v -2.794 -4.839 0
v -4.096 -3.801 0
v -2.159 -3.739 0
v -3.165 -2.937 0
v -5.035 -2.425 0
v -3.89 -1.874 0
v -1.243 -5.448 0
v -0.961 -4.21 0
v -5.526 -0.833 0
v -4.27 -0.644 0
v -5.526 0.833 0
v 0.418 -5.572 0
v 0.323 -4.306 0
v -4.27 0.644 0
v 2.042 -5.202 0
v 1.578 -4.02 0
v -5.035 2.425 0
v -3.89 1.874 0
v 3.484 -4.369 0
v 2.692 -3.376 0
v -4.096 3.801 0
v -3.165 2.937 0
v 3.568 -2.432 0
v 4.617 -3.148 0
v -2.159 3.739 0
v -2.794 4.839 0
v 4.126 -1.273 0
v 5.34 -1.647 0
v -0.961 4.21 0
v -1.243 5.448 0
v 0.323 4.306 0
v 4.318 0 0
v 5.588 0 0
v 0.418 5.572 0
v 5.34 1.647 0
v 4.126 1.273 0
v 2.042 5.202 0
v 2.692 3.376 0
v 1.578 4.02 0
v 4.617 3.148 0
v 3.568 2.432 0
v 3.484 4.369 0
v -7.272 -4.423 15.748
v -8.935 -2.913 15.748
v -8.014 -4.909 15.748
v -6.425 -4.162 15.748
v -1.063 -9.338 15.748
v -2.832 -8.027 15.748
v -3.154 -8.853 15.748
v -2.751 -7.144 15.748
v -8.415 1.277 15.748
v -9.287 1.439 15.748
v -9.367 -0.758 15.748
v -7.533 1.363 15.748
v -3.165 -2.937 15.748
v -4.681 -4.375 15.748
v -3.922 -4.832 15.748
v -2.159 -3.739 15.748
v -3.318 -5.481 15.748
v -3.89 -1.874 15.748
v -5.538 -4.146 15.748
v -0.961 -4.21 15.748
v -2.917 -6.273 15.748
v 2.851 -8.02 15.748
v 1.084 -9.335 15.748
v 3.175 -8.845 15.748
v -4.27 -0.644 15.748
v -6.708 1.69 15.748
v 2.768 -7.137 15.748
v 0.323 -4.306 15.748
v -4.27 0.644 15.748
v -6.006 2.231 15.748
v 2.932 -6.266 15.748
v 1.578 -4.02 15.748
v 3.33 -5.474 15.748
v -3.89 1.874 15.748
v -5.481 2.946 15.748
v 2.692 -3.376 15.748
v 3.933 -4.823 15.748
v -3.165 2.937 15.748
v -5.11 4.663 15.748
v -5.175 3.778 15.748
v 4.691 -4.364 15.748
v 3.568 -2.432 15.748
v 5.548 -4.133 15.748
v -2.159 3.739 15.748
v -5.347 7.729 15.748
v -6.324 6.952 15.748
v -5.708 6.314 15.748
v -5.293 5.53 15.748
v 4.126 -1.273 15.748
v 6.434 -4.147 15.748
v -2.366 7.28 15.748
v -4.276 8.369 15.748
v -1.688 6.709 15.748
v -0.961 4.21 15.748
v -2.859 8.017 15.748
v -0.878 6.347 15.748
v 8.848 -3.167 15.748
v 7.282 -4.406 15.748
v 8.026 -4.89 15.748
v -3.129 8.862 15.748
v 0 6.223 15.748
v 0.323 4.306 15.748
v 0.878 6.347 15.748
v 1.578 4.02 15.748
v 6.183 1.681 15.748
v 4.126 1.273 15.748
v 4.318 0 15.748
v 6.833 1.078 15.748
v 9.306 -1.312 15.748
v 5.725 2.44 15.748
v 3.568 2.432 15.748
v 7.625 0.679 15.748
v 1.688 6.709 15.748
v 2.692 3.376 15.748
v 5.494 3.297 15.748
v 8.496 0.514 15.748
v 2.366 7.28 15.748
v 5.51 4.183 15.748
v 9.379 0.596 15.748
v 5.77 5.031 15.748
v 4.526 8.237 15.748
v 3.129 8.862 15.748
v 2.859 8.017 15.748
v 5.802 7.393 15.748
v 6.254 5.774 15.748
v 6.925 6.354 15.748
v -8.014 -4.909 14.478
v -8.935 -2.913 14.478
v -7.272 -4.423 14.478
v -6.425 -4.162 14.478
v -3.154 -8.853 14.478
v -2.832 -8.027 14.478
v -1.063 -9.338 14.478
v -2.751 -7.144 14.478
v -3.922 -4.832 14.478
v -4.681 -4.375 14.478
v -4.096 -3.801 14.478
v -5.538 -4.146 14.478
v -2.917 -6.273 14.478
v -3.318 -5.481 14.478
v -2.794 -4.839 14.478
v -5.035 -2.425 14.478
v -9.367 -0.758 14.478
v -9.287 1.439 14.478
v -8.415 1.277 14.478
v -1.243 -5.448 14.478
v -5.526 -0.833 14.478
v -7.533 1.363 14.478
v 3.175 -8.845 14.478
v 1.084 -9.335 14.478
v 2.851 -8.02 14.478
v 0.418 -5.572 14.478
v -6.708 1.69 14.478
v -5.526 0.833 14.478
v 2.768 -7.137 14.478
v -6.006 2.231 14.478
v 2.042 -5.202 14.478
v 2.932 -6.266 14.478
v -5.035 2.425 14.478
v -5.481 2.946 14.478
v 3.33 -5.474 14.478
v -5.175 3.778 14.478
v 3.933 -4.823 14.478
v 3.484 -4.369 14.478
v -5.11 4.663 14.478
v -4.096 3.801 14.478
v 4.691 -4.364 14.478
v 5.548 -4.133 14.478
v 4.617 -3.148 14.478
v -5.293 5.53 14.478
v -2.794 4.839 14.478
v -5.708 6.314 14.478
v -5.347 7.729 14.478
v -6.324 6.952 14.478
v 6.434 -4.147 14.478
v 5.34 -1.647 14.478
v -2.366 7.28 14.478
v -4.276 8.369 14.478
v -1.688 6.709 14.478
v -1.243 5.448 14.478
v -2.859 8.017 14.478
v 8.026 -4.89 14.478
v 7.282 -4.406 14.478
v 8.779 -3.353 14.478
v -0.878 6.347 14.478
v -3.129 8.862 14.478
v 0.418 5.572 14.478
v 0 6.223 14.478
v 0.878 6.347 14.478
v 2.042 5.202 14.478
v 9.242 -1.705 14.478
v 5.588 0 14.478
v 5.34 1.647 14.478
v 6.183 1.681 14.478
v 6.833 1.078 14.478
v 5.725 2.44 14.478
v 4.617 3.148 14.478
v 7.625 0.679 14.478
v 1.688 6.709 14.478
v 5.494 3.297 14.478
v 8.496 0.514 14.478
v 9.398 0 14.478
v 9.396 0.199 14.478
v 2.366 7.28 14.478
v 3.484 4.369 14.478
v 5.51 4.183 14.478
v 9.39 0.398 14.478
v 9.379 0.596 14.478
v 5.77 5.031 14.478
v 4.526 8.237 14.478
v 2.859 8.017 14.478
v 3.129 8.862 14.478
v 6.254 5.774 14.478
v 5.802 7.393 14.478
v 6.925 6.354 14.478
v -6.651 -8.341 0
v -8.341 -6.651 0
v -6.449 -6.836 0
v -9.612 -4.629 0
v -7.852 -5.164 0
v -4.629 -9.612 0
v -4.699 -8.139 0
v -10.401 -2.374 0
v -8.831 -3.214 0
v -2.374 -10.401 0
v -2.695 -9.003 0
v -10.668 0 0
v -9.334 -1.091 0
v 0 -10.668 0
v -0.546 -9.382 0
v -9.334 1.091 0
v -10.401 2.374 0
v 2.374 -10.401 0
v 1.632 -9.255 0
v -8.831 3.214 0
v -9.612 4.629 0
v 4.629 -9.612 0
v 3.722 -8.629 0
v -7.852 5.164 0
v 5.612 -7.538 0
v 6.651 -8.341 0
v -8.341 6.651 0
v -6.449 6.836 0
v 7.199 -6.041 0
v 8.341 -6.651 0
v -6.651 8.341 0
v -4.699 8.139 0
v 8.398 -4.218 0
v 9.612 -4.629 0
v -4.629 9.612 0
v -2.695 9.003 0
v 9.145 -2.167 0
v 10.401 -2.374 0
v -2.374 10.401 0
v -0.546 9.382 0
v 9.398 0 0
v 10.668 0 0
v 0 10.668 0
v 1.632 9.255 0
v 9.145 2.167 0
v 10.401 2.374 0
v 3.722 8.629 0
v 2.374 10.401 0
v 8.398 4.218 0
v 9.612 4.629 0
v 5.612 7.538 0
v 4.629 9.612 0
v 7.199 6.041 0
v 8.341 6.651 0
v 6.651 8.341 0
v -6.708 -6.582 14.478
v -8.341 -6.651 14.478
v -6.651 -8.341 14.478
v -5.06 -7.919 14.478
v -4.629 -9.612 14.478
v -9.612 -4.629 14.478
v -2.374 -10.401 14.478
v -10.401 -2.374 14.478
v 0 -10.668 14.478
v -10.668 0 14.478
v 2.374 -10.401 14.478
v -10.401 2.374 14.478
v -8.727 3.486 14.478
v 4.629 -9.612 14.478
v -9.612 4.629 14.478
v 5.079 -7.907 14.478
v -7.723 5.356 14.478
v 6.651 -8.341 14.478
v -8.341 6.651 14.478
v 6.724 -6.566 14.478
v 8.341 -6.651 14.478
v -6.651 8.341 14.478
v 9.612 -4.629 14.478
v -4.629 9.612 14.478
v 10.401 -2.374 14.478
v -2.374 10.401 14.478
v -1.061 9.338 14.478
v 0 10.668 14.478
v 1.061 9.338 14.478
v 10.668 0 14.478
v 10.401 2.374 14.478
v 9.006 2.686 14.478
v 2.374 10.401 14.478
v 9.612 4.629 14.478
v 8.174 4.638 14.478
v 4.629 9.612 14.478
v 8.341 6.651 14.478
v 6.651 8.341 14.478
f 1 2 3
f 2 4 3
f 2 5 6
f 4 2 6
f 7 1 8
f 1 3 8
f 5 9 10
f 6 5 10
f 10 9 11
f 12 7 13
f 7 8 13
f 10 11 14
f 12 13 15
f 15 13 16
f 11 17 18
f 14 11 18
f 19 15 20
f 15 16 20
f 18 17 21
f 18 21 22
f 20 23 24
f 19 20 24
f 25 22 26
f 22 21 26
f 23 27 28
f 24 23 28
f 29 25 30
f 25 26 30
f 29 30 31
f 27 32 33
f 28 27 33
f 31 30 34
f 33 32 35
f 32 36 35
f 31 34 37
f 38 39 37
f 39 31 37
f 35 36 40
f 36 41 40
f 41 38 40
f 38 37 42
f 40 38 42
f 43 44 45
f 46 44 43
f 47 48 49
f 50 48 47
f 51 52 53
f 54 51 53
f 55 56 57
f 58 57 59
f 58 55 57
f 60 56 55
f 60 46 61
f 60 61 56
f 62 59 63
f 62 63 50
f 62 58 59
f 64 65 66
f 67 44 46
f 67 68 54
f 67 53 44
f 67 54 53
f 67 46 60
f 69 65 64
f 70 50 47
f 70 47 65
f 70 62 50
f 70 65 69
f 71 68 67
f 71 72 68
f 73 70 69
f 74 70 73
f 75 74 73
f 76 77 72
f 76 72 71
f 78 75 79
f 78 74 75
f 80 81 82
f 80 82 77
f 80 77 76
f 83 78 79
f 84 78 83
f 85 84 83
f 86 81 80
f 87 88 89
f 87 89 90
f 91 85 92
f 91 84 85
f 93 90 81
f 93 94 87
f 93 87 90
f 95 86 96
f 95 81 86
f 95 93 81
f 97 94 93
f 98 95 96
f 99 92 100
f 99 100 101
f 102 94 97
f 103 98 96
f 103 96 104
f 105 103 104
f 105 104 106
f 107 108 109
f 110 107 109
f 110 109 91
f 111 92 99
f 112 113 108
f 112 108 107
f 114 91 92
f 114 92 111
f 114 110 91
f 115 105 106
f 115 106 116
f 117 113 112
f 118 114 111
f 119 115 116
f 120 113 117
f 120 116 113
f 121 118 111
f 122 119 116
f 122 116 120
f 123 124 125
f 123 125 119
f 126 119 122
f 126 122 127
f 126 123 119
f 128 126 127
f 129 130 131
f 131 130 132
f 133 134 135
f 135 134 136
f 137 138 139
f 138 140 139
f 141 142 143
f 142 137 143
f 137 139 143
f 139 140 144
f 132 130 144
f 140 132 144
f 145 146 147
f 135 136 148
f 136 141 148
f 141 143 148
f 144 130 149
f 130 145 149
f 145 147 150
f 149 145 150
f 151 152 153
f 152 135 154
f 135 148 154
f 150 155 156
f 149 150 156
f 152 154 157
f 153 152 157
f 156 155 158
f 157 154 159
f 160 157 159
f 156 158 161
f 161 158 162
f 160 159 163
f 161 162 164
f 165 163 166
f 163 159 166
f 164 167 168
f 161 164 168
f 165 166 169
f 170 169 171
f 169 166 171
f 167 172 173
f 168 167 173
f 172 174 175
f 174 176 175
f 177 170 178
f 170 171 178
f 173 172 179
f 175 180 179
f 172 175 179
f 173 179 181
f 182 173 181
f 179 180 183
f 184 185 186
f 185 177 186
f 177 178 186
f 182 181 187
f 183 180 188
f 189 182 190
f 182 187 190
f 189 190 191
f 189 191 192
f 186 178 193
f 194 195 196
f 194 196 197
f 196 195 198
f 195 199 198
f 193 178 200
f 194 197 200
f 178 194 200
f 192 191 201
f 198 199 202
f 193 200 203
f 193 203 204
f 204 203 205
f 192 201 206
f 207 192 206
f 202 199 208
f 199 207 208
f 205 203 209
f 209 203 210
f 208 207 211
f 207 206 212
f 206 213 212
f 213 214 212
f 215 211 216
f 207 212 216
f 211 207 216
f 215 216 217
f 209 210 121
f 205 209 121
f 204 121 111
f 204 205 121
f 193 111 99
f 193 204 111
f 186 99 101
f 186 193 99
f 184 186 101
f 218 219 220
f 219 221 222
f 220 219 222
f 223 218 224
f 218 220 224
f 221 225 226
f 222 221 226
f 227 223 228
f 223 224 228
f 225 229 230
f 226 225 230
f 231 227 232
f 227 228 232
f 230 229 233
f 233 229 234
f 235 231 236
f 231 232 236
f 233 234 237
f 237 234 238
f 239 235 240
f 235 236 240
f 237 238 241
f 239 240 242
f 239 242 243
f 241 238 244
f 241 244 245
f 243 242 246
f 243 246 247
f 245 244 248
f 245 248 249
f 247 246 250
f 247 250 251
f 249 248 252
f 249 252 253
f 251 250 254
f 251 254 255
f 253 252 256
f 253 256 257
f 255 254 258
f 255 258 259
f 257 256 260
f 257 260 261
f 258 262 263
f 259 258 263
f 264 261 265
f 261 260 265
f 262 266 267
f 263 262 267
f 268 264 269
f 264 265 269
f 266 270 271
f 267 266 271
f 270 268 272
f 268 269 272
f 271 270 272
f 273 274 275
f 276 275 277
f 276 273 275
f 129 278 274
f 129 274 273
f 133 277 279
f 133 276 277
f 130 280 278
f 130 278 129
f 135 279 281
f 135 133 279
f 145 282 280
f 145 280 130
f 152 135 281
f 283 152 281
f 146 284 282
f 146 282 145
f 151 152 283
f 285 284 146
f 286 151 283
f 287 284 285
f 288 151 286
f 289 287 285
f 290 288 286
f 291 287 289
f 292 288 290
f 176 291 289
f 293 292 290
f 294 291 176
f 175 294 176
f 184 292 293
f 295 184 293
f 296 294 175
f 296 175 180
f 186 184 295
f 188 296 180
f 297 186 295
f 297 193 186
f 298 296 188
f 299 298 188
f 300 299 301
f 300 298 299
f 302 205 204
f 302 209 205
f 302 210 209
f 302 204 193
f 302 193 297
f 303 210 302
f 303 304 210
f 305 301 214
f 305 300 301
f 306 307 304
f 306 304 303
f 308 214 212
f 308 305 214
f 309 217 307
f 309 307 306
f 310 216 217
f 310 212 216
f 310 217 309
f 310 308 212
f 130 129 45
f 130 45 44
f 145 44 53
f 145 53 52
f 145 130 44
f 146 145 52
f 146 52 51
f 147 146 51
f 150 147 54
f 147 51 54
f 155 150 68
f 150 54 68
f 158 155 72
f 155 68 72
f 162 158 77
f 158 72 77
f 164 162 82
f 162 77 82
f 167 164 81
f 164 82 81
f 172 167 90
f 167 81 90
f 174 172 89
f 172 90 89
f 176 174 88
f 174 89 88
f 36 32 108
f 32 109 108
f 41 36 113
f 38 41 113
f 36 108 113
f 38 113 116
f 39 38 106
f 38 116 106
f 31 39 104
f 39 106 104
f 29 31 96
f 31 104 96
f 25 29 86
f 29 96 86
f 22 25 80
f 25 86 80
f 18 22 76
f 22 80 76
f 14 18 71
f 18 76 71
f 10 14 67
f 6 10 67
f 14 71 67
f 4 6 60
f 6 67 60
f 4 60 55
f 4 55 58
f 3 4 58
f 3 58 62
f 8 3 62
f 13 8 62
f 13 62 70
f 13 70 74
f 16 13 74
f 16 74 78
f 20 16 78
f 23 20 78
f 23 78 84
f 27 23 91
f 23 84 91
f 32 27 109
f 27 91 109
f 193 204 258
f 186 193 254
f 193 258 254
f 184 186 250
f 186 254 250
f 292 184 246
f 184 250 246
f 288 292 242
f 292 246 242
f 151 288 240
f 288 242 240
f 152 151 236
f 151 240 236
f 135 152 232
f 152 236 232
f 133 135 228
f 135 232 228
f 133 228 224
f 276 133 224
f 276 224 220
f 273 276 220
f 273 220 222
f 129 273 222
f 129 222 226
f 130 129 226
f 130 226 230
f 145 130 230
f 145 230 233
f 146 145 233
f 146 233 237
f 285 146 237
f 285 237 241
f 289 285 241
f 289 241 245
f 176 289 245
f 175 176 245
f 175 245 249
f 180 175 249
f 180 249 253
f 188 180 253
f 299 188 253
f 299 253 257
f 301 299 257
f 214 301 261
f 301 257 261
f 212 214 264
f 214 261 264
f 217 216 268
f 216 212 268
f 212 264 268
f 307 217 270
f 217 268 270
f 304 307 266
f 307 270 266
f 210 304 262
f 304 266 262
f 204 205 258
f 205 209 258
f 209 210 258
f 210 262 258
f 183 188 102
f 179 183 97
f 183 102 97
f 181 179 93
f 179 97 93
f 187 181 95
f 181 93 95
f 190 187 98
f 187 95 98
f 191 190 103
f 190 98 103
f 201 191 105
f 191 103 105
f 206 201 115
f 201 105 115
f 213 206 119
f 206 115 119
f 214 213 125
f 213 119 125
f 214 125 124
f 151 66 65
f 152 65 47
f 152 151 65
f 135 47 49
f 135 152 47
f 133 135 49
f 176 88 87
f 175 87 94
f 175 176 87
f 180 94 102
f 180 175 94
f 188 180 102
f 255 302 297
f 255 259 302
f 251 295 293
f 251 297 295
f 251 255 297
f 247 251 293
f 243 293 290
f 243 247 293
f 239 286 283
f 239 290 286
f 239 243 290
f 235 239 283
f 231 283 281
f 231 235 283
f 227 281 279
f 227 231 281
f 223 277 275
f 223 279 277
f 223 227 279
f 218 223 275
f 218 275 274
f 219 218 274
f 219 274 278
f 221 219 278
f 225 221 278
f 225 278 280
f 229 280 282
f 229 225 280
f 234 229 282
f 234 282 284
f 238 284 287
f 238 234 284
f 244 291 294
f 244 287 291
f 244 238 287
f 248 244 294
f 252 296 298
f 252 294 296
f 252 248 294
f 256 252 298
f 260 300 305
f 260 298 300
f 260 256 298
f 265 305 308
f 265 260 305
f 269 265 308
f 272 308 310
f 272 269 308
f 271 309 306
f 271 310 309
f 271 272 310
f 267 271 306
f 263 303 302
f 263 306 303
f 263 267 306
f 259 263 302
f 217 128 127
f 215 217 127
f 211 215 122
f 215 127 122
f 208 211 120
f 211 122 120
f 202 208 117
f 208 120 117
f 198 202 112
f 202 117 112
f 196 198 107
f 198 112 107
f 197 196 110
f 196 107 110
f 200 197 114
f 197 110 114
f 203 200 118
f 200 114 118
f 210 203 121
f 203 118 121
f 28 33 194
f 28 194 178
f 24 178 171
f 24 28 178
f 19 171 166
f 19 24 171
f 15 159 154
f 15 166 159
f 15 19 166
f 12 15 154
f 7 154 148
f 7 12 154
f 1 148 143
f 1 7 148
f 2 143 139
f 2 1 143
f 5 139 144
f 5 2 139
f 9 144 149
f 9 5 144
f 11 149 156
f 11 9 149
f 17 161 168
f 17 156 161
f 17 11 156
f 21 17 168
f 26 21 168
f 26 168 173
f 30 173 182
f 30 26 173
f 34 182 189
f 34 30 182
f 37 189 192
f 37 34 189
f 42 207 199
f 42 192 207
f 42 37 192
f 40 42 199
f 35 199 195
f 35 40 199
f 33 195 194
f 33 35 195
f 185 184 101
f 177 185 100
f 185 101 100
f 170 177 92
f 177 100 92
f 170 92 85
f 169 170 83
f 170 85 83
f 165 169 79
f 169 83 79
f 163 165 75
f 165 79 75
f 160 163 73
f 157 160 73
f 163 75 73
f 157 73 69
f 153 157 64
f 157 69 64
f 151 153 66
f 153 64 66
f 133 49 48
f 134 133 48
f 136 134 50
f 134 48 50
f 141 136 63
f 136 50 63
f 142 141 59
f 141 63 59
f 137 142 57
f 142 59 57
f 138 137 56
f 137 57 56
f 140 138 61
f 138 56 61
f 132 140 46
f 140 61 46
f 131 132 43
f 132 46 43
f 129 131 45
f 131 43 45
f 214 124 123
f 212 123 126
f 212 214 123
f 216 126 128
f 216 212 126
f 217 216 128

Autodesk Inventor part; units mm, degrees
ref_plane "YZ Plane" through (0, 0, 0) normal (1, 0, 0) x (0, 1, 0)
ref_plane "XZ Plane" through (0, 0, 0) normal (0, 1, 0) x (-1, 0, 0)
sketch "Sketch1" plane through (0, 0, 0) normal (0, 0, 1) x (1, 0, 0)
  circle A0 centre (0, 0) radius 10.668
  circle A1 centre (0, 0) radius 9.398
  circle A2 centre (0, 0) radius 5.588
  circle A3 centre (0, 0) radius 4.318
  dimension "d0" = 21.336
  dimension "d1" = 1.27
  dimension "d2" = 11.176
  dimension "d3" = 1.27
extrude "Extrusion1" add sketch "Sketch1" along normal blind 14.478
ref_plane "Work Plane1" through (0, 0, 7.239) normal (0, 0, 1) x (1, 0, 0)
sketch "Sketch2" plane through (0, 0, 14.478) normal (0, 0, 1) x (1, 0, 0)
  circle A0 centre (0, 0) radius 9.398
  circle A1 centre (0, 0) radius 10.668 projected
  dimension "d6" = 1.27
extrude "Extrusion2" add sketch "Sketch2" along normal blind 1.27 contours A0
sketch "Sketch3" plane through (0, 0, 15.748) normal (0, 0, 1) x (1, 0, 0)
  circle A0 centre (0, 0) radius 4.318
extrude "Extrusion3" cut sketch "Sketch3" against normal blind 1.27
sketch "Sketch4" plane through (0, 0, 15.748) normal (0, 0, 1) x (1, 0, 0)
  circle A0 centre (0, 0) radius 9.398 projected
  circle A1 centre (0, 9.398) radius 3.175
  dimension "d11" = 6.35
extrude "Extrusion4" cut sketch "Sketch4" against normal blind 1.27 contours A1 A0 | A0 A1 picked at (0, 8.2996) picked at (-0.0897, 10.4125)
sketch "Sketch5" plane through (0, 0, 15.748) normal (0, 0, 1) x (1, 0, 0)
  circle A0 centre (0, 0) radius 9.398 projected
  circle A1 centre (5.9392, -7.2834) radius 3.175
  dimension "d14" = 6.35
extrude "Extrusion5" cut sketch "Sketch5" against normal blind 1.27 contours A1 A0 | A0 A1 picked at (5.2451, -6.4322) picked at (6.5249, -8.1165)
sketch "Sketch6" plane through (0, 0, 15.748) normal (0, 0, 1) x (1, 0, 0)
  arc A0 (-3.1294, 8.8617) -> (3.1751, -8.8454) centre (0, 0) ccw projected
  circle A1 centre (-5.9223, -7.2972) radius 3.175
  dimension "d17" = 6.35
extrude "Extrusion6" cut sketch "Sketch6" against normal blind 1.27
sketch "Sketch7" plane through (0, 0, 15.748) normal (0, 0, 1) x (1, 0, 0)
  circle A0 centre (0, 0) radius 9.398 projected
  circle A1 centre (-8.278, 4.4494) radius 3.175
  dimension "d20" = 6.35
extrude "Extrusion7" cut sketch "Sketch7" against normal blind 1.27 contours A1 A0 | A0 A1 picked at (-7.3008, 3.9478) picked at (-9.1749, 4.9315)
sketch "Sketch8" plane through (0, 0, 15.748) normal (0, 0, 1) x (1, 0, 0)
  arc A0 (8.0256, -4.8901) -> (3.1294, 8.8617) centre (0, 0) ccw projected
  circle A1 centre (8.6453, 3.6853) radius 3.175
  dimension "d23" = 6.35
extrude "Extrusion8" cut sketch "Sketch8" against normal blind 1.27
properties part number "wheel"
